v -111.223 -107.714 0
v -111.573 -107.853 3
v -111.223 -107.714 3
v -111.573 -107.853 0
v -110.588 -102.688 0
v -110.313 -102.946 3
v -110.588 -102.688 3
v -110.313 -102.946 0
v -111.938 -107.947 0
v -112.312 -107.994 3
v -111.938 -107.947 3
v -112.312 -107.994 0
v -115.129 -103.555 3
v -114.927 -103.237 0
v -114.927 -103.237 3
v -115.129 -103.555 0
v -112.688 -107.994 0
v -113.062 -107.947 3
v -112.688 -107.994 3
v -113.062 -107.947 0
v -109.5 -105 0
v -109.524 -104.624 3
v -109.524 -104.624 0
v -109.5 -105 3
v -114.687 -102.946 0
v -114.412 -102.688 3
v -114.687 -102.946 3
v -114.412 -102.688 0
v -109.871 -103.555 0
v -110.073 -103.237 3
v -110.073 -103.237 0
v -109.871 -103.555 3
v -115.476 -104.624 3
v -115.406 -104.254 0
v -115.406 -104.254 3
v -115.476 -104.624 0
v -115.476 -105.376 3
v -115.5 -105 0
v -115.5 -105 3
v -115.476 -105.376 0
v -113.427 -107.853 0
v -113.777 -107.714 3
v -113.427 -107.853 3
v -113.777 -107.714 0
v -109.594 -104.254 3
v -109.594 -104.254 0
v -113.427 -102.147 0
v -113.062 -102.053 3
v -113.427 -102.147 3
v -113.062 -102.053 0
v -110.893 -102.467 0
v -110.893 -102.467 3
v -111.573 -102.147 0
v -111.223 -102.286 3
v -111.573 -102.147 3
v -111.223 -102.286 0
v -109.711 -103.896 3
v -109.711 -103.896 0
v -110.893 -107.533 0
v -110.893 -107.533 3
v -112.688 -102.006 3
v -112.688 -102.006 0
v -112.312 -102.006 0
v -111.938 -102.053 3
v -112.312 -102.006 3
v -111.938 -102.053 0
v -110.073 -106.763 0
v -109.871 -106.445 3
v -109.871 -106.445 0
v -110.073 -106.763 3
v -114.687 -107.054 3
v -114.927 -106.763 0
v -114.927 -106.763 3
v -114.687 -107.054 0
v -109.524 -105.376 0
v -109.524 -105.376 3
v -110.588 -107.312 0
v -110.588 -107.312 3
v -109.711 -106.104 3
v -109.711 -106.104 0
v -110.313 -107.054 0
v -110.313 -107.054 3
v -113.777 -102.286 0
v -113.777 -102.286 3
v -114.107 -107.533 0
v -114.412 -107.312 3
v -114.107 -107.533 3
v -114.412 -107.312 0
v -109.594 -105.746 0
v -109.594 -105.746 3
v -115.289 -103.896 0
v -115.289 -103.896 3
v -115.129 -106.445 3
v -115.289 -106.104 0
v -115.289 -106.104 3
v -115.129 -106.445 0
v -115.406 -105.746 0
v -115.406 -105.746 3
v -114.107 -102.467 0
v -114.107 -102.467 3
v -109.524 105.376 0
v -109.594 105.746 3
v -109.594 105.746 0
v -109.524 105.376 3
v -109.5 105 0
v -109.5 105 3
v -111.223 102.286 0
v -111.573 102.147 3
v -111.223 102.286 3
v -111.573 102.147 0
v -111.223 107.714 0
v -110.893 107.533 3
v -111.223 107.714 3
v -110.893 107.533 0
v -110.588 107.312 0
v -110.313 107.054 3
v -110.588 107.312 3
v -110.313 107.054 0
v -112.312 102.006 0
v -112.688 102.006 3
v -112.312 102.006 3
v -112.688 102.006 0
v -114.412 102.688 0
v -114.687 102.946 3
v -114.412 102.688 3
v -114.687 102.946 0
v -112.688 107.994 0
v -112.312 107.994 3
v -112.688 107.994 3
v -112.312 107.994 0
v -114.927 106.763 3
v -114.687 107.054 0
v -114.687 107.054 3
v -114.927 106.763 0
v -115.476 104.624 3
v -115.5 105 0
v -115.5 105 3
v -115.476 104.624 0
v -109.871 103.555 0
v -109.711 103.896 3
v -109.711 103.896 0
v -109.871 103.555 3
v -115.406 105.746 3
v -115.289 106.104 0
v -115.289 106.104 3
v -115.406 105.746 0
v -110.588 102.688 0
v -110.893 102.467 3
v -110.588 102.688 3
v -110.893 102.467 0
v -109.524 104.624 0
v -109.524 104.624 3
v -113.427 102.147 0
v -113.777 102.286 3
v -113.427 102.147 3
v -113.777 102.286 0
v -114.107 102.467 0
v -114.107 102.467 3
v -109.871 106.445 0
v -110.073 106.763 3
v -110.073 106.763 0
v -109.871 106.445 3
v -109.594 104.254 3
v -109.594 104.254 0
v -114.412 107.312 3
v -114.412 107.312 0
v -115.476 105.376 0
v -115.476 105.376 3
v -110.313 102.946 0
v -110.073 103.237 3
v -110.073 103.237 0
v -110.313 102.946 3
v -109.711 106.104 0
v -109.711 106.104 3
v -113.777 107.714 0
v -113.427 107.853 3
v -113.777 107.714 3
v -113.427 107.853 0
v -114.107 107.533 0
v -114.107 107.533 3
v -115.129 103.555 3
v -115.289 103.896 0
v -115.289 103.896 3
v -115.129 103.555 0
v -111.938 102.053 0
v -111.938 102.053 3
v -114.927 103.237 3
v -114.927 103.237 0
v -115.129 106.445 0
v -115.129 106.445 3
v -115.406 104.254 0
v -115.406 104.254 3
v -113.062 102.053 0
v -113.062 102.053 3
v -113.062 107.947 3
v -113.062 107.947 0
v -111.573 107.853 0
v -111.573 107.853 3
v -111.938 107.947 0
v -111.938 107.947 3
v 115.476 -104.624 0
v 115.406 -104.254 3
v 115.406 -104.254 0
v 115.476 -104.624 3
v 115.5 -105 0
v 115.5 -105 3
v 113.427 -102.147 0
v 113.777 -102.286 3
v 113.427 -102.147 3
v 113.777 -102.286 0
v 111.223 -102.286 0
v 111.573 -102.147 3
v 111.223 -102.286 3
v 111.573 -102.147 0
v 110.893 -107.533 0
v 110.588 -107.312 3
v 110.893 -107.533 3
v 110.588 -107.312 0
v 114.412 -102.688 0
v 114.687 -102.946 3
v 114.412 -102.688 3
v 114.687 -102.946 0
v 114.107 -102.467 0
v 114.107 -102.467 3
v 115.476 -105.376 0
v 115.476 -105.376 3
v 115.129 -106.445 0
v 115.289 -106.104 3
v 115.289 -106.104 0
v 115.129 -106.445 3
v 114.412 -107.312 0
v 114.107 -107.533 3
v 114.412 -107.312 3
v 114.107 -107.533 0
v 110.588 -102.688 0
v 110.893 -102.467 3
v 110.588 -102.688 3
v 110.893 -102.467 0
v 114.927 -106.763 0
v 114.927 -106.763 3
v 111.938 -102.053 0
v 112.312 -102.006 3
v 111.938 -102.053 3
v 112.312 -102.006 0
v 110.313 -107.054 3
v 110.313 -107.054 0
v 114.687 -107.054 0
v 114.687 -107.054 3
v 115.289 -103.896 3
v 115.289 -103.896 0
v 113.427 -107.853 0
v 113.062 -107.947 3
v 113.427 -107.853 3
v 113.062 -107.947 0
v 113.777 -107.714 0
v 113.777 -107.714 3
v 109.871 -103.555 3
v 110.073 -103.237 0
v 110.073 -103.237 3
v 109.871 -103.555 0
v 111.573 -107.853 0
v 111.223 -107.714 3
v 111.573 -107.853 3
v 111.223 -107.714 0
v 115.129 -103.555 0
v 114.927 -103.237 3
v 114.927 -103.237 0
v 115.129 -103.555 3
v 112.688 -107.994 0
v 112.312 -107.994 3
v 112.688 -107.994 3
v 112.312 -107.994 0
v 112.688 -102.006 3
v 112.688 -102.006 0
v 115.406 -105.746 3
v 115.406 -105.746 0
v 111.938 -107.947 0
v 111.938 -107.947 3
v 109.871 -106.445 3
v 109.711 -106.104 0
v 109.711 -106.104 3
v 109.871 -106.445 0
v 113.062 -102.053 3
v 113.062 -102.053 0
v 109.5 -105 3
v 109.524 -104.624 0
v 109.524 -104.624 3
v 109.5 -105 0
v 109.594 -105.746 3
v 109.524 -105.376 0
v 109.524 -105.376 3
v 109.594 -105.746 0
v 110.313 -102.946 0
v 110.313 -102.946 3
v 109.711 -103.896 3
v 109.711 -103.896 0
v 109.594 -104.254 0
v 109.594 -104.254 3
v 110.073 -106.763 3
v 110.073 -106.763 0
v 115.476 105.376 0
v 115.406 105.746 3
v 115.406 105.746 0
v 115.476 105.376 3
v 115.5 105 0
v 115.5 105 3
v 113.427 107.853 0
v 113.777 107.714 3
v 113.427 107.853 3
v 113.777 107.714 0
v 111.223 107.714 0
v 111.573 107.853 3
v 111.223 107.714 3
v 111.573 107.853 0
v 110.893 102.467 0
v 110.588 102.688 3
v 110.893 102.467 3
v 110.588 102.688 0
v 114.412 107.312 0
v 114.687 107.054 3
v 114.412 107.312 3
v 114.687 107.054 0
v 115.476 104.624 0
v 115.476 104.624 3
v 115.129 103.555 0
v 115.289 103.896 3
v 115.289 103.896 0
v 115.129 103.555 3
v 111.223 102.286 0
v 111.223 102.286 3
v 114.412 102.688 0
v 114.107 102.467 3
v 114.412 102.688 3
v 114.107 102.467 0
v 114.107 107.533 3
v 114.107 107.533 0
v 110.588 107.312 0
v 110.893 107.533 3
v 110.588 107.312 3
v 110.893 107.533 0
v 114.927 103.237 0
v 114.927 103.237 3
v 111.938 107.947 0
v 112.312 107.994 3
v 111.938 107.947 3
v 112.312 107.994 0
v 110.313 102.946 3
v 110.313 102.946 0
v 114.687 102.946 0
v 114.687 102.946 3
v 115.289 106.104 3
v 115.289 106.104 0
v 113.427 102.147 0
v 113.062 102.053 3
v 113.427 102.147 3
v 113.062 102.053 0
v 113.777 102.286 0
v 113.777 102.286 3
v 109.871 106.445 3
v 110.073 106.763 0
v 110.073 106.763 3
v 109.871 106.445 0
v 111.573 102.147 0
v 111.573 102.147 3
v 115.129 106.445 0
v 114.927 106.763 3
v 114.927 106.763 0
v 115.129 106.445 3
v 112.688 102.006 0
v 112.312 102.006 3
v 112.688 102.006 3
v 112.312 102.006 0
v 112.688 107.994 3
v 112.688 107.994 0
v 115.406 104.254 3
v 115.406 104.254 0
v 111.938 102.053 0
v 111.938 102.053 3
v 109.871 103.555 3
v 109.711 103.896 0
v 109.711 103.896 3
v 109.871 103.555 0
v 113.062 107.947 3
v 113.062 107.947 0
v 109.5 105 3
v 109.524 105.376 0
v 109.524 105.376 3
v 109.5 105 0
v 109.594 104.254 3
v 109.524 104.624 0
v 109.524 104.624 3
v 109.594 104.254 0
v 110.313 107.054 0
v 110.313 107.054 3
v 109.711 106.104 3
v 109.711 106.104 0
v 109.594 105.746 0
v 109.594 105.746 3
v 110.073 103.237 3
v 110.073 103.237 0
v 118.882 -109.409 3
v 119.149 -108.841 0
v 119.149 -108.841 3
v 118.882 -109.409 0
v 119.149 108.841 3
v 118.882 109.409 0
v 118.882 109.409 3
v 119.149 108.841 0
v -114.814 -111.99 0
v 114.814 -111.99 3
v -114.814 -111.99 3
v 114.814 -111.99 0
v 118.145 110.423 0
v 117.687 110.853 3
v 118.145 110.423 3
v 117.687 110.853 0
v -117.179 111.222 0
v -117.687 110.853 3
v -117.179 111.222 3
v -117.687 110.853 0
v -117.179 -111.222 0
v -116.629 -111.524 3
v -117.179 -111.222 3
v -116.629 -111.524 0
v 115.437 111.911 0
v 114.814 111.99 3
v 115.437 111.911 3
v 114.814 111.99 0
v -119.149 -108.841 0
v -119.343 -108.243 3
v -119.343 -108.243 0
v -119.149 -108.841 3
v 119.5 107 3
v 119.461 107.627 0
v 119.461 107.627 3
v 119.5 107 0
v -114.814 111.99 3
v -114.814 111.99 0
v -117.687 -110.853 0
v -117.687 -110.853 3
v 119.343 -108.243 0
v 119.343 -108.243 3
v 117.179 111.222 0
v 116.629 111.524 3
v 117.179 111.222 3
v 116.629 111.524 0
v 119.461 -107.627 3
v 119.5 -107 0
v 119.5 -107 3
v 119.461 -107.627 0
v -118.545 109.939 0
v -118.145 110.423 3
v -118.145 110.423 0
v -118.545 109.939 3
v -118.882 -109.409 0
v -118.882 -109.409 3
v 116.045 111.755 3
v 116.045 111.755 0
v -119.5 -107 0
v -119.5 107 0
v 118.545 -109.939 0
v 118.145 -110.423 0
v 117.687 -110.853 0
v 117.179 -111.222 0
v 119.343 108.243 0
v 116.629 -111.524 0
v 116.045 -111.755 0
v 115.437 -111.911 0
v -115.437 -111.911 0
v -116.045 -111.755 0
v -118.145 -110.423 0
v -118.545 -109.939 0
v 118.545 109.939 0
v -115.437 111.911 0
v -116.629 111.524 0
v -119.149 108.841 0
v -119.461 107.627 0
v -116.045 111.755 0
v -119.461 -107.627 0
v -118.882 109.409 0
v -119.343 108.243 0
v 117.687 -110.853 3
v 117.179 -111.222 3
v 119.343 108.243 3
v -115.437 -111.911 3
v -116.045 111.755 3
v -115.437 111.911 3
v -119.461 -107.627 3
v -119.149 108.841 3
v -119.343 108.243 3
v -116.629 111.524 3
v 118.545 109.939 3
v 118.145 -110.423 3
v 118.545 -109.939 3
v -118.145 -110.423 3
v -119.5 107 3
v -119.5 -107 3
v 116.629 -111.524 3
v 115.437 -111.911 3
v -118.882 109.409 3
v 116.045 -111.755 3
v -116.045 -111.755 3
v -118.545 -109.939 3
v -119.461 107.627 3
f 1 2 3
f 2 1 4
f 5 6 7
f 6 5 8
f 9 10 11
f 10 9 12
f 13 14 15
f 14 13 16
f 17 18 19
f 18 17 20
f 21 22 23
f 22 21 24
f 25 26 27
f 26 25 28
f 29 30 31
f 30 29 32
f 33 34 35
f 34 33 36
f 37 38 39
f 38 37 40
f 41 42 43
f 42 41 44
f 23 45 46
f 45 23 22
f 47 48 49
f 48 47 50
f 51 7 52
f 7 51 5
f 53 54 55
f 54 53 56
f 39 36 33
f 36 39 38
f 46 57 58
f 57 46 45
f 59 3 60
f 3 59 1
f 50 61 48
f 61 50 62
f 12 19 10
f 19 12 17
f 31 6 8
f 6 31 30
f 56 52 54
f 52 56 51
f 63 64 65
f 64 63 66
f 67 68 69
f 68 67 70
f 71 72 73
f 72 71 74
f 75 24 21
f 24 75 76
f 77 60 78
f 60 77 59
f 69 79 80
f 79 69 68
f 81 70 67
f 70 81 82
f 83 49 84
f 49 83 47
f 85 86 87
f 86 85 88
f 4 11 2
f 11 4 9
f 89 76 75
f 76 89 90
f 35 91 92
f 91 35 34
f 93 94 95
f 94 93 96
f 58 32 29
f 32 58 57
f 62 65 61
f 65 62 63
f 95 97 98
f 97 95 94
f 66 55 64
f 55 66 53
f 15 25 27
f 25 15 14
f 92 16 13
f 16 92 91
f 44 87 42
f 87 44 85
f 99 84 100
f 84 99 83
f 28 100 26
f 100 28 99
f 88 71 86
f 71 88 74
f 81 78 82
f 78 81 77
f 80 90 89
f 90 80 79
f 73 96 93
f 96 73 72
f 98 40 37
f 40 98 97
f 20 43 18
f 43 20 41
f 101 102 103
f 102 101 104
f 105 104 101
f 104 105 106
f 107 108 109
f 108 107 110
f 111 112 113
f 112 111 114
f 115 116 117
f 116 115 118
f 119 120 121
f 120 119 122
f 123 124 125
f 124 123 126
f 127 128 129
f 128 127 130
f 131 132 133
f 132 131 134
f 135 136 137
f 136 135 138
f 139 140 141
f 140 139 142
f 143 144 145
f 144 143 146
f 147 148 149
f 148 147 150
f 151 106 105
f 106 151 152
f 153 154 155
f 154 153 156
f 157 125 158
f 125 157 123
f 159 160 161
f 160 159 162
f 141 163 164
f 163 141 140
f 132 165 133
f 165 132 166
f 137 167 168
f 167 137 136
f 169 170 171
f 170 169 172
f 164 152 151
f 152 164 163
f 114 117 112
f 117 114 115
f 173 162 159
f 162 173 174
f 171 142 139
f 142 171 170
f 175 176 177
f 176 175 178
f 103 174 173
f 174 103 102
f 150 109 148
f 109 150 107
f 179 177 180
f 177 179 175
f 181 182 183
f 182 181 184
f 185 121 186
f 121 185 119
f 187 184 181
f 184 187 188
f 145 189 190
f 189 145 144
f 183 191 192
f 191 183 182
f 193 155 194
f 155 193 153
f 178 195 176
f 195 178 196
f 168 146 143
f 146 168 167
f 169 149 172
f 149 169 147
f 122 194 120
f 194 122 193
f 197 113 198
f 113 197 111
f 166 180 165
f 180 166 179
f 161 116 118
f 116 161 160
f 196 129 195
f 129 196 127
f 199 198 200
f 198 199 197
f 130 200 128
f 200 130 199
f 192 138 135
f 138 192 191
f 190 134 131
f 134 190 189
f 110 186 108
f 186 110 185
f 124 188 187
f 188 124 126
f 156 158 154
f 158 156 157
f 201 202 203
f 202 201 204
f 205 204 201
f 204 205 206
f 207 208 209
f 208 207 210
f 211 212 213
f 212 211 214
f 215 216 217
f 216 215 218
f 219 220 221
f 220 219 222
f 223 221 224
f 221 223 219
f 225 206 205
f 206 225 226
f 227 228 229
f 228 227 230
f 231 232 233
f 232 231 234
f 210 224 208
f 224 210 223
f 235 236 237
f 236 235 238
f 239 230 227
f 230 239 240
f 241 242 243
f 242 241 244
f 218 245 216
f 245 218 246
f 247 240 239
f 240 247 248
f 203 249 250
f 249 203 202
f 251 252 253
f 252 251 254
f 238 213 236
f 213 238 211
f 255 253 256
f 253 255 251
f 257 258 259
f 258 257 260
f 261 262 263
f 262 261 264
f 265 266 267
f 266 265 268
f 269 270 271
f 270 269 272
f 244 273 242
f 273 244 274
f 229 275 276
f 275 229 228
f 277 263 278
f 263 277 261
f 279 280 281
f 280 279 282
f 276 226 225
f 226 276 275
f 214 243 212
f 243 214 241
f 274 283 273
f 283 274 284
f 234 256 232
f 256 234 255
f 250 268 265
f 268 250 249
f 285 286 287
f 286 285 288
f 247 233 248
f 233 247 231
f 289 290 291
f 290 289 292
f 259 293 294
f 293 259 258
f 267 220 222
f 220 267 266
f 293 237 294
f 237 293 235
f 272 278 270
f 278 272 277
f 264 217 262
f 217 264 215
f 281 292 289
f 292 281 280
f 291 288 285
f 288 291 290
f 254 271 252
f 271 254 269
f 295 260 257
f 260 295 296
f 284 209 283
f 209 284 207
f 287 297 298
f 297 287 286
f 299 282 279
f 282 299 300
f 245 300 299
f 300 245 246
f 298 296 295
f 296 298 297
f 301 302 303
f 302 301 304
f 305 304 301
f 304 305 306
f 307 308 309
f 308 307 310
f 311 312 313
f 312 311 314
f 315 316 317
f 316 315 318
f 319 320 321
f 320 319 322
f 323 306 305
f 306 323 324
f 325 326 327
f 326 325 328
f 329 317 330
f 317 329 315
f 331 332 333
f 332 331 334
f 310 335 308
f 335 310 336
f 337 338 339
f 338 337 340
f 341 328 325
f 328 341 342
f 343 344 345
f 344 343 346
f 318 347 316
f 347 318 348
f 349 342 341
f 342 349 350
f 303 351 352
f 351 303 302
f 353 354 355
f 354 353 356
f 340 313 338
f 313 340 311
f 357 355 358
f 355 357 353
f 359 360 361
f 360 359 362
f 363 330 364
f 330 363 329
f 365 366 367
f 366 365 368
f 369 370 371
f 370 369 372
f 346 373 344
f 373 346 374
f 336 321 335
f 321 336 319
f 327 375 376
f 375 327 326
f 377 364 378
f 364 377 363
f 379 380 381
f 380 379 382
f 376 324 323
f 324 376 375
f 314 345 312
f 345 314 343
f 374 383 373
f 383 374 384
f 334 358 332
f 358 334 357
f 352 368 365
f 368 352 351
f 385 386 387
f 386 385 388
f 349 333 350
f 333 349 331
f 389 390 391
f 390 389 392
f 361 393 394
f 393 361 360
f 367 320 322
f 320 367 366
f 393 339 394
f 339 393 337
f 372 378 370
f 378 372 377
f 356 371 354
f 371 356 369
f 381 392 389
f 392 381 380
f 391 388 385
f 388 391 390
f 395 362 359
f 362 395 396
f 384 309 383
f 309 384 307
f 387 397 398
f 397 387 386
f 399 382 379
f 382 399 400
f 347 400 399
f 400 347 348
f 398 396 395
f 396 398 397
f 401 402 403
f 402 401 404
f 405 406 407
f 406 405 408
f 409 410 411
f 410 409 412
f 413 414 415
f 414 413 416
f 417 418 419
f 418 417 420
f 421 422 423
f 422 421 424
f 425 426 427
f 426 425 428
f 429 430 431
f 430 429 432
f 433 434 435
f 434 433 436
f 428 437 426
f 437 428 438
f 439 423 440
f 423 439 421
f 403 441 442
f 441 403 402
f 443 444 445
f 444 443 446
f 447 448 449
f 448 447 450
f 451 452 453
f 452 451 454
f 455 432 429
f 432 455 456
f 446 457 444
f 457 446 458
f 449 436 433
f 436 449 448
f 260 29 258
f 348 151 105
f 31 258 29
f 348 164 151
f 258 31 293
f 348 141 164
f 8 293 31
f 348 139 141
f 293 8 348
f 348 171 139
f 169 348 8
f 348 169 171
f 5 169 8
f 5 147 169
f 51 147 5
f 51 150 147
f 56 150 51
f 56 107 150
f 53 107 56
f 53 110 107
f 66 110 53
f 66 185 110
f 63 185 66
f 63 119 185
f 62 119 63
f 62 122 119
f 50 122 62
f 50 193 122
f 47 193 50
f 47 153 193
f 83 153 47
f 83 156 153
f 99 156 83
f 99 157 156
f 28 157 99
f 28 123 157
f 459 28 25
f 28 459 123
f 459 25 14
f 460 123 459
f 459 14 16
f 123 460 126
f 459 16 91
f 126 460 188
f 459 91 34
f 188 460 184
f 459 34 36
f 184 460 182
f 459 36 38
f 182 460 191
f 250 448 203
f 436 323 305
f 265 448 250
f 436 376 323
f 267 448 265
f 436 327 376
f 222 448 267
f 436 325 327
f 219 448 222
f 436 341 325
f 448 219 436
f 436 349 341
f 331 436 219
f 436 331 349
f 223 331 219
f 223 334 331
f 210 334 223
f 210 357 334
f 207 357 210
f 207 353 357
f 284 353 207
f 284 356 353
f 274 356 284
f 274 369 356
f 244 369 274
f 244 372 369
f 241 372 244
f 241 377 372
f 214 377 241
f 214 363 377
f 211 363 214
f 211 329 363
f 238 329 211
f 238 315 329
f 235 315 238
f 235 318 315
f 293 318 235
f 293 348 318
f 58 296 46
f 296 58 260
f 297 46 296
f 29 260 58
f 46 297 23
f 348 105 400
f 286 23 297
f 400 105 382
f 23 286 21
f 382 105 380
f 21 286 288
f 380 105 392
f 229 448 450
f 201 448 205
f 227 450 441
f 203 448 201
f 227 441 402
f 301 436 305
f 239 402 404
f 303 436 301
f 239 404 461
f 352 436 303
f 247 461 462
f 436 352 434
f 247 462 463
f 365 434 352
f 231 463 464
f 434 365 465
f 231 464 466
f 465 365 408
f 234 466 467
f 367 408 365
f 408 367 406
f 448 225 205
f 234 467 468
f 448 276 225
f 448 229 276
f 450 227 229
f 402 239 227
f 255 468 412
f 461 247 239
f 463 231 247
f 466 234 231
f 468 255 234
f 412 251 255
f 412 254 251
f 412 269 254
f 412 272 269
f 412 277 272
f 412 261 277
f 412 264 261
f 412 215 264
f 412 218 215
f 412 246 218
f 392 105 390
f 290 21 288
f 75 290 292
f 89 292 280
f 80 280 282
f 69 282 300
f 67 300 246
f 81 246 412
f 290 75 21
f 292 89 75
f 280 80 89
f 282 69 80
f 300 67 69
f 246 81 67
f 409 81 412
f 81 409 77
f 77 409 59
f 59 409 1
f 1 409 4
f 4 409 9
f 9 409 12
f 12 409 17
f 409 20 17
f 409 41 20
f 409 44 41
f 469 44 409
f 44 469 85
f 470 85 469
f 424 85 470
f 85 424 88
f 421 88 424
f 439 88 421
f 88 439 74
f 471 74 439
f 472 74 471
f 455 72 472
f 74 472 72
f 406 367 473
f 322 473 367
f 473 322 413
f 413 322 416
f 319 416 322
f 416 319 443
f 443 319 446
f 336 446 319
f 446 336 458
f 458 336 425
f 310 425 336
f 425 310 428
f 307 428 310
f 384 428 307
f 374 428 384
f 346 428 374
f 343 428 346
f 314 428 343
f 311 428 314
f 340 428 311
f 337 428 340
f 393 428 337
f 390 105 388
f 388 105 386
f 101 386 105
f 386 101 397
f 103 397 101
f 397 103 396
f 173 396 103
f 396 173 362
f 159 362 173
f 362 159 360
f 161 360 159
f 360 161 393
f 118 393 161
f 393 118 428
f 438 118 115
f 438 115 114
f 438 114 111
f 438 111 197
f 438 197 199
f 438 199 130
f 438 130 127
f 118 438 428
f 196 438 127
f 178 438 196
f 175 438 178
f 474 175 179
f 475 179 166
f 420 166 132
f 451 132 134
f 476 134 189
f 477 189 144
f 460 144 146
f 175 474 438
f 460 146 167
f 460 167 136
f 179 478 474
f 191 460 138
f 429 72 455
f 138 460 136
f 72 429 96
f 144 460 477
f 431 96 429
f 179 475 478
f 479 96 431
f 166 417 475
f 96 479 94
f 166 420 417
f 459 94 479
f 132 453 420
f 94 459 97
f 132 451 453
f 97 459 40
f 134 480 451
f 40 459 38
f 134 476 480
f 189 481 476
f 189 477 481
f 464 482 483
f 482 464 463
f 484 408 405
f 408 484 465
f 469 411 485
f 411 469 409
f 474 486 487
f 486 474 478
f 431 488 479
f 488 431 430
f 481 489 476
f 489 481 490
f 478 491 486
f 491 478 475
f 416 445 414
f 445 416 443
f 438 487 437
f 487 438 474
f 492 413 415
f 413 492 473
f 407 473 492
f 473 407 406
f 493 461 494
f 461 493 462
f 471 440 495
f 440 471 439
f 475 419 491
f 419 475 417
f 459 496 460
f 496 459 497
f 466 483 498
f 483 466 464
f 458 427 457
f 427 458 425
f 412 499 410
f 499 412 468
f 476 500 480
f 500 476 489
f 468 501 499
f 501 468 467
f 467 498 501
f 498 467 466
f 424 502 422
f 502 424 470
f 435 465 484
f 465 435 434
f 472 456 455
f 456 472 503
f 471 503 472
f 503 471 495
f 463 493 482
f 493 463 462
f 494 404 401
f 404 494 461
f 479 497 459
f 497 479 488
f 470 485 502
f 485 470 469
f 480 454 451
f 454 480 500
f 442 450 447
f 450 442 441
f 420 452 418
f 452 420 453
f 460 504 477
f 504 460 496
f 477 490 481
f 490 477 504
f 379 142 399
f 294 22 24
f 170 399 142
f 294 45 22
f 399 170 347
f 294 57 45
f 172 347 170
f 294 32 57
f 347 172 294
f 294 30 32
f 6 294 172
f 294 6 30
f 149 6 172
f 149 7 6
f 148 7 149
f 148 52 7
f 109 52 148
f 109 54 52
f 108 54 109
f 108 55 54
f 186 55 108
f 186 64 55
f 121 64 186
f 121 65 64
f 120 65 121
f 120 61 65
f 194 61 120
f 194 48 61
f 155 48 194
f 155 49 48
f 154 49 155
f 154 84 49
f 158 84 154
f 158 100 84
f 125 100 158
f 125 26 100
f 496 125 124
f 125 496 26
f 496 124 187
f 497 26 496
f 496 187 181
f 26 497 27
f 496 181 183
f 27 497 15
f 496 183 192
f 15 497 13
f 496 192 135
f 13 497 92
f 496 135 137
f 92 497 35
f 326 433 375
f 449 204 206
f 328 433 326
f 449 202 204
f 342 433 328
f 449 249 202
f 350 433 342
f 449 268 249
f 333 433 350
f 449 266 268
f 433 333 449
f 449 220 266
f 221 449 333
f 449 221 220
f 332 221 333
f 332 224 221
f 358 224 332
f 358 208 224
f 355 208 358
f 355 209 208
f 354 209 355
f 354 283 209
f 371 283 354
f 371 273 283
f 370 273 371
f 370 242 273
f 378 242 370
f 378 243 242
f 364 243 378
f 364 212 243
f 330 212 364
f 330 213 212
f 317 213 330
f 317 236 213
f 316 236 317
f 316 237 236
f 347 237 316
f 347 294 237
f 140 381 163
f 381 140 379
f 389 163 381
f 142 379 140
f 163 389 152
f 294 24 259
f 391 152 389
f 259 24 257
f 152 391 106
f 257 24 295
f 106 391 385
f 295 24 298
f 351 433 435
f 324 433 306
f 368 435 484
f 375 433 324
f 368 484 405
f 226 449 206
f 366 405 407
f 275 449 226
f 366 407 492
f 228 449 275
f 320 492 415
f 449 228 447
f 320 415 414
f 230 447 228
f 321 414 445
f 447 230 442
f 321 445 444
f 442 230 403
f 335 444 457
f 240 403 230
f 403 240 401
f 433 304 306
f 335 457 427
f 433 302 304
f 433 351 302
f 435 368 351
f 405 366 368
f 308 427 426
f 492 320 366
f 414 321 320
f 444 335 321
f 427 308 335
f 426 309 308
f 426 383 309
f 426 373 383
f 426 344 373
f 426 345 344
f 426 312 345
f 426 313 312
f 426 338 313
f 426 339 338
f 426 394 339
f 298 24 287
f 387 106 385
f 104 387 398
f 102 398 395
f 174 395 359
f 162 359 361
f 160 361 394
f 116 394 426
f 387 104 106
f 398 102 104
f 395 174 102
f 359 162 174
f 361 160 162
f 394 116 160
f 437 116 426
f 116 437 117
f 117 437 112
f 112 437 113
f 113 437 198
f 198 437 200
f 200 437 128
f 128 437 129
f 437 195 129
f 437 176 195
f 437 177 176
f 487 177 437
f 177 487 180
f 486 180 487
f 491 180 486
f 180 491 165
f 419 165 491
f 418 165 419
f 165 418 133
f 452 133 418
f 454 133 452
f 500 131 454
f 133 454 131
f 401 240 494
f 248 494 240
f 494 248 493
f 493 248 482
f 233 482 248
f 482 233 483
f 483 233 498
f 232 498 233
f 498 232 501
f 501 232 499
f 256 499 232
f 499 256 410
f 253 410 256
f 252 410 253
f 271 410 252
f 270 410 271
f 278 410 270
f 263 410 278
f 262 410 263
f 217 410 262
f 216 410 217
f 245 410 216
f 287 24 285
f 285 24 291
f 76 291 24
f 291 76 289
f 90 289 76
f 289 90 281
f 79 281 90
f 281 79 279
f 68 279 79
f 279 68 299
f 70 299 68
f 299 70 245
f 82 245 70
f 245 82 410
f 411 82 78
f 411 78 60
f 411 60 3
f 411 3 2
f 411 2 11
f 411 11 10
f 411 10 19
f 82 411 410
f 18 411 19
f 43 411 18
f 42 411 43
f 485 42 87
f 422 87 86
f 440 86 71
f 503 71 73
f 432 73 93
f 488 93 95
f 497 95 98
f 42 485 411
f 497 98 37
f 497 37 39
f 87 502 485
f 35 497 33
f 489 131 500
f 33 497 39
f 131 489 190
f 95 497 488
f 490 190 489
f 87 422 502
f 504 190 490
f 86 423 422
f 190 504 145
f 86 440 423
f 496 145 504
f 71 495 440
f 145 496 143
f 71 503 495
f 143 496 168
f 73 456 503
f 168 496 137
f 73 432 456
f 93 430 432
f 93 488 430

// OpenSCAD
$fn = 50;


difference() {
	union() {
		hull() {
			translate(v = [-114.5000000000, 107.0000000000, 0]) {
				cylinder(h = 3, r = 5);
			}
			translate(v = [114.5000000000, 107.0000000000, 0]) {
				cylinder(h = 3, r = 5);
			}
			translate(v = [-114.5000000000, -107.0000000000, 0]) {
				cylinder(h = 3, r = 5);
			}
			translate(v = [114.5000000000, -107.0000000000, 0]) {
				cylinder(h = 3, r = 5);
			}
		}
	}
	union() {
		translate(v = [-112.5000000000, -105.0000000000, -100.0000000000]) {
			cylinder(h = 200, r = 3.0000000000);
		}
		translate(v = [-112.5000000000, 105.0000000000, -100.0000000000]) {
			cylinder(h = 200, r = 3.0000000000);
		}
		translate(v = [112.5000000000, -105.0000000000, -100.0000000000]) {
			cylinder(h = 200, r = 3.0000000000);
		}
		translate(v = [112.5000000000, 105.0000000000, -100.0000000000]) {
			cylinder(h = 200, r = 3.0000000000);
		}
	}
}
